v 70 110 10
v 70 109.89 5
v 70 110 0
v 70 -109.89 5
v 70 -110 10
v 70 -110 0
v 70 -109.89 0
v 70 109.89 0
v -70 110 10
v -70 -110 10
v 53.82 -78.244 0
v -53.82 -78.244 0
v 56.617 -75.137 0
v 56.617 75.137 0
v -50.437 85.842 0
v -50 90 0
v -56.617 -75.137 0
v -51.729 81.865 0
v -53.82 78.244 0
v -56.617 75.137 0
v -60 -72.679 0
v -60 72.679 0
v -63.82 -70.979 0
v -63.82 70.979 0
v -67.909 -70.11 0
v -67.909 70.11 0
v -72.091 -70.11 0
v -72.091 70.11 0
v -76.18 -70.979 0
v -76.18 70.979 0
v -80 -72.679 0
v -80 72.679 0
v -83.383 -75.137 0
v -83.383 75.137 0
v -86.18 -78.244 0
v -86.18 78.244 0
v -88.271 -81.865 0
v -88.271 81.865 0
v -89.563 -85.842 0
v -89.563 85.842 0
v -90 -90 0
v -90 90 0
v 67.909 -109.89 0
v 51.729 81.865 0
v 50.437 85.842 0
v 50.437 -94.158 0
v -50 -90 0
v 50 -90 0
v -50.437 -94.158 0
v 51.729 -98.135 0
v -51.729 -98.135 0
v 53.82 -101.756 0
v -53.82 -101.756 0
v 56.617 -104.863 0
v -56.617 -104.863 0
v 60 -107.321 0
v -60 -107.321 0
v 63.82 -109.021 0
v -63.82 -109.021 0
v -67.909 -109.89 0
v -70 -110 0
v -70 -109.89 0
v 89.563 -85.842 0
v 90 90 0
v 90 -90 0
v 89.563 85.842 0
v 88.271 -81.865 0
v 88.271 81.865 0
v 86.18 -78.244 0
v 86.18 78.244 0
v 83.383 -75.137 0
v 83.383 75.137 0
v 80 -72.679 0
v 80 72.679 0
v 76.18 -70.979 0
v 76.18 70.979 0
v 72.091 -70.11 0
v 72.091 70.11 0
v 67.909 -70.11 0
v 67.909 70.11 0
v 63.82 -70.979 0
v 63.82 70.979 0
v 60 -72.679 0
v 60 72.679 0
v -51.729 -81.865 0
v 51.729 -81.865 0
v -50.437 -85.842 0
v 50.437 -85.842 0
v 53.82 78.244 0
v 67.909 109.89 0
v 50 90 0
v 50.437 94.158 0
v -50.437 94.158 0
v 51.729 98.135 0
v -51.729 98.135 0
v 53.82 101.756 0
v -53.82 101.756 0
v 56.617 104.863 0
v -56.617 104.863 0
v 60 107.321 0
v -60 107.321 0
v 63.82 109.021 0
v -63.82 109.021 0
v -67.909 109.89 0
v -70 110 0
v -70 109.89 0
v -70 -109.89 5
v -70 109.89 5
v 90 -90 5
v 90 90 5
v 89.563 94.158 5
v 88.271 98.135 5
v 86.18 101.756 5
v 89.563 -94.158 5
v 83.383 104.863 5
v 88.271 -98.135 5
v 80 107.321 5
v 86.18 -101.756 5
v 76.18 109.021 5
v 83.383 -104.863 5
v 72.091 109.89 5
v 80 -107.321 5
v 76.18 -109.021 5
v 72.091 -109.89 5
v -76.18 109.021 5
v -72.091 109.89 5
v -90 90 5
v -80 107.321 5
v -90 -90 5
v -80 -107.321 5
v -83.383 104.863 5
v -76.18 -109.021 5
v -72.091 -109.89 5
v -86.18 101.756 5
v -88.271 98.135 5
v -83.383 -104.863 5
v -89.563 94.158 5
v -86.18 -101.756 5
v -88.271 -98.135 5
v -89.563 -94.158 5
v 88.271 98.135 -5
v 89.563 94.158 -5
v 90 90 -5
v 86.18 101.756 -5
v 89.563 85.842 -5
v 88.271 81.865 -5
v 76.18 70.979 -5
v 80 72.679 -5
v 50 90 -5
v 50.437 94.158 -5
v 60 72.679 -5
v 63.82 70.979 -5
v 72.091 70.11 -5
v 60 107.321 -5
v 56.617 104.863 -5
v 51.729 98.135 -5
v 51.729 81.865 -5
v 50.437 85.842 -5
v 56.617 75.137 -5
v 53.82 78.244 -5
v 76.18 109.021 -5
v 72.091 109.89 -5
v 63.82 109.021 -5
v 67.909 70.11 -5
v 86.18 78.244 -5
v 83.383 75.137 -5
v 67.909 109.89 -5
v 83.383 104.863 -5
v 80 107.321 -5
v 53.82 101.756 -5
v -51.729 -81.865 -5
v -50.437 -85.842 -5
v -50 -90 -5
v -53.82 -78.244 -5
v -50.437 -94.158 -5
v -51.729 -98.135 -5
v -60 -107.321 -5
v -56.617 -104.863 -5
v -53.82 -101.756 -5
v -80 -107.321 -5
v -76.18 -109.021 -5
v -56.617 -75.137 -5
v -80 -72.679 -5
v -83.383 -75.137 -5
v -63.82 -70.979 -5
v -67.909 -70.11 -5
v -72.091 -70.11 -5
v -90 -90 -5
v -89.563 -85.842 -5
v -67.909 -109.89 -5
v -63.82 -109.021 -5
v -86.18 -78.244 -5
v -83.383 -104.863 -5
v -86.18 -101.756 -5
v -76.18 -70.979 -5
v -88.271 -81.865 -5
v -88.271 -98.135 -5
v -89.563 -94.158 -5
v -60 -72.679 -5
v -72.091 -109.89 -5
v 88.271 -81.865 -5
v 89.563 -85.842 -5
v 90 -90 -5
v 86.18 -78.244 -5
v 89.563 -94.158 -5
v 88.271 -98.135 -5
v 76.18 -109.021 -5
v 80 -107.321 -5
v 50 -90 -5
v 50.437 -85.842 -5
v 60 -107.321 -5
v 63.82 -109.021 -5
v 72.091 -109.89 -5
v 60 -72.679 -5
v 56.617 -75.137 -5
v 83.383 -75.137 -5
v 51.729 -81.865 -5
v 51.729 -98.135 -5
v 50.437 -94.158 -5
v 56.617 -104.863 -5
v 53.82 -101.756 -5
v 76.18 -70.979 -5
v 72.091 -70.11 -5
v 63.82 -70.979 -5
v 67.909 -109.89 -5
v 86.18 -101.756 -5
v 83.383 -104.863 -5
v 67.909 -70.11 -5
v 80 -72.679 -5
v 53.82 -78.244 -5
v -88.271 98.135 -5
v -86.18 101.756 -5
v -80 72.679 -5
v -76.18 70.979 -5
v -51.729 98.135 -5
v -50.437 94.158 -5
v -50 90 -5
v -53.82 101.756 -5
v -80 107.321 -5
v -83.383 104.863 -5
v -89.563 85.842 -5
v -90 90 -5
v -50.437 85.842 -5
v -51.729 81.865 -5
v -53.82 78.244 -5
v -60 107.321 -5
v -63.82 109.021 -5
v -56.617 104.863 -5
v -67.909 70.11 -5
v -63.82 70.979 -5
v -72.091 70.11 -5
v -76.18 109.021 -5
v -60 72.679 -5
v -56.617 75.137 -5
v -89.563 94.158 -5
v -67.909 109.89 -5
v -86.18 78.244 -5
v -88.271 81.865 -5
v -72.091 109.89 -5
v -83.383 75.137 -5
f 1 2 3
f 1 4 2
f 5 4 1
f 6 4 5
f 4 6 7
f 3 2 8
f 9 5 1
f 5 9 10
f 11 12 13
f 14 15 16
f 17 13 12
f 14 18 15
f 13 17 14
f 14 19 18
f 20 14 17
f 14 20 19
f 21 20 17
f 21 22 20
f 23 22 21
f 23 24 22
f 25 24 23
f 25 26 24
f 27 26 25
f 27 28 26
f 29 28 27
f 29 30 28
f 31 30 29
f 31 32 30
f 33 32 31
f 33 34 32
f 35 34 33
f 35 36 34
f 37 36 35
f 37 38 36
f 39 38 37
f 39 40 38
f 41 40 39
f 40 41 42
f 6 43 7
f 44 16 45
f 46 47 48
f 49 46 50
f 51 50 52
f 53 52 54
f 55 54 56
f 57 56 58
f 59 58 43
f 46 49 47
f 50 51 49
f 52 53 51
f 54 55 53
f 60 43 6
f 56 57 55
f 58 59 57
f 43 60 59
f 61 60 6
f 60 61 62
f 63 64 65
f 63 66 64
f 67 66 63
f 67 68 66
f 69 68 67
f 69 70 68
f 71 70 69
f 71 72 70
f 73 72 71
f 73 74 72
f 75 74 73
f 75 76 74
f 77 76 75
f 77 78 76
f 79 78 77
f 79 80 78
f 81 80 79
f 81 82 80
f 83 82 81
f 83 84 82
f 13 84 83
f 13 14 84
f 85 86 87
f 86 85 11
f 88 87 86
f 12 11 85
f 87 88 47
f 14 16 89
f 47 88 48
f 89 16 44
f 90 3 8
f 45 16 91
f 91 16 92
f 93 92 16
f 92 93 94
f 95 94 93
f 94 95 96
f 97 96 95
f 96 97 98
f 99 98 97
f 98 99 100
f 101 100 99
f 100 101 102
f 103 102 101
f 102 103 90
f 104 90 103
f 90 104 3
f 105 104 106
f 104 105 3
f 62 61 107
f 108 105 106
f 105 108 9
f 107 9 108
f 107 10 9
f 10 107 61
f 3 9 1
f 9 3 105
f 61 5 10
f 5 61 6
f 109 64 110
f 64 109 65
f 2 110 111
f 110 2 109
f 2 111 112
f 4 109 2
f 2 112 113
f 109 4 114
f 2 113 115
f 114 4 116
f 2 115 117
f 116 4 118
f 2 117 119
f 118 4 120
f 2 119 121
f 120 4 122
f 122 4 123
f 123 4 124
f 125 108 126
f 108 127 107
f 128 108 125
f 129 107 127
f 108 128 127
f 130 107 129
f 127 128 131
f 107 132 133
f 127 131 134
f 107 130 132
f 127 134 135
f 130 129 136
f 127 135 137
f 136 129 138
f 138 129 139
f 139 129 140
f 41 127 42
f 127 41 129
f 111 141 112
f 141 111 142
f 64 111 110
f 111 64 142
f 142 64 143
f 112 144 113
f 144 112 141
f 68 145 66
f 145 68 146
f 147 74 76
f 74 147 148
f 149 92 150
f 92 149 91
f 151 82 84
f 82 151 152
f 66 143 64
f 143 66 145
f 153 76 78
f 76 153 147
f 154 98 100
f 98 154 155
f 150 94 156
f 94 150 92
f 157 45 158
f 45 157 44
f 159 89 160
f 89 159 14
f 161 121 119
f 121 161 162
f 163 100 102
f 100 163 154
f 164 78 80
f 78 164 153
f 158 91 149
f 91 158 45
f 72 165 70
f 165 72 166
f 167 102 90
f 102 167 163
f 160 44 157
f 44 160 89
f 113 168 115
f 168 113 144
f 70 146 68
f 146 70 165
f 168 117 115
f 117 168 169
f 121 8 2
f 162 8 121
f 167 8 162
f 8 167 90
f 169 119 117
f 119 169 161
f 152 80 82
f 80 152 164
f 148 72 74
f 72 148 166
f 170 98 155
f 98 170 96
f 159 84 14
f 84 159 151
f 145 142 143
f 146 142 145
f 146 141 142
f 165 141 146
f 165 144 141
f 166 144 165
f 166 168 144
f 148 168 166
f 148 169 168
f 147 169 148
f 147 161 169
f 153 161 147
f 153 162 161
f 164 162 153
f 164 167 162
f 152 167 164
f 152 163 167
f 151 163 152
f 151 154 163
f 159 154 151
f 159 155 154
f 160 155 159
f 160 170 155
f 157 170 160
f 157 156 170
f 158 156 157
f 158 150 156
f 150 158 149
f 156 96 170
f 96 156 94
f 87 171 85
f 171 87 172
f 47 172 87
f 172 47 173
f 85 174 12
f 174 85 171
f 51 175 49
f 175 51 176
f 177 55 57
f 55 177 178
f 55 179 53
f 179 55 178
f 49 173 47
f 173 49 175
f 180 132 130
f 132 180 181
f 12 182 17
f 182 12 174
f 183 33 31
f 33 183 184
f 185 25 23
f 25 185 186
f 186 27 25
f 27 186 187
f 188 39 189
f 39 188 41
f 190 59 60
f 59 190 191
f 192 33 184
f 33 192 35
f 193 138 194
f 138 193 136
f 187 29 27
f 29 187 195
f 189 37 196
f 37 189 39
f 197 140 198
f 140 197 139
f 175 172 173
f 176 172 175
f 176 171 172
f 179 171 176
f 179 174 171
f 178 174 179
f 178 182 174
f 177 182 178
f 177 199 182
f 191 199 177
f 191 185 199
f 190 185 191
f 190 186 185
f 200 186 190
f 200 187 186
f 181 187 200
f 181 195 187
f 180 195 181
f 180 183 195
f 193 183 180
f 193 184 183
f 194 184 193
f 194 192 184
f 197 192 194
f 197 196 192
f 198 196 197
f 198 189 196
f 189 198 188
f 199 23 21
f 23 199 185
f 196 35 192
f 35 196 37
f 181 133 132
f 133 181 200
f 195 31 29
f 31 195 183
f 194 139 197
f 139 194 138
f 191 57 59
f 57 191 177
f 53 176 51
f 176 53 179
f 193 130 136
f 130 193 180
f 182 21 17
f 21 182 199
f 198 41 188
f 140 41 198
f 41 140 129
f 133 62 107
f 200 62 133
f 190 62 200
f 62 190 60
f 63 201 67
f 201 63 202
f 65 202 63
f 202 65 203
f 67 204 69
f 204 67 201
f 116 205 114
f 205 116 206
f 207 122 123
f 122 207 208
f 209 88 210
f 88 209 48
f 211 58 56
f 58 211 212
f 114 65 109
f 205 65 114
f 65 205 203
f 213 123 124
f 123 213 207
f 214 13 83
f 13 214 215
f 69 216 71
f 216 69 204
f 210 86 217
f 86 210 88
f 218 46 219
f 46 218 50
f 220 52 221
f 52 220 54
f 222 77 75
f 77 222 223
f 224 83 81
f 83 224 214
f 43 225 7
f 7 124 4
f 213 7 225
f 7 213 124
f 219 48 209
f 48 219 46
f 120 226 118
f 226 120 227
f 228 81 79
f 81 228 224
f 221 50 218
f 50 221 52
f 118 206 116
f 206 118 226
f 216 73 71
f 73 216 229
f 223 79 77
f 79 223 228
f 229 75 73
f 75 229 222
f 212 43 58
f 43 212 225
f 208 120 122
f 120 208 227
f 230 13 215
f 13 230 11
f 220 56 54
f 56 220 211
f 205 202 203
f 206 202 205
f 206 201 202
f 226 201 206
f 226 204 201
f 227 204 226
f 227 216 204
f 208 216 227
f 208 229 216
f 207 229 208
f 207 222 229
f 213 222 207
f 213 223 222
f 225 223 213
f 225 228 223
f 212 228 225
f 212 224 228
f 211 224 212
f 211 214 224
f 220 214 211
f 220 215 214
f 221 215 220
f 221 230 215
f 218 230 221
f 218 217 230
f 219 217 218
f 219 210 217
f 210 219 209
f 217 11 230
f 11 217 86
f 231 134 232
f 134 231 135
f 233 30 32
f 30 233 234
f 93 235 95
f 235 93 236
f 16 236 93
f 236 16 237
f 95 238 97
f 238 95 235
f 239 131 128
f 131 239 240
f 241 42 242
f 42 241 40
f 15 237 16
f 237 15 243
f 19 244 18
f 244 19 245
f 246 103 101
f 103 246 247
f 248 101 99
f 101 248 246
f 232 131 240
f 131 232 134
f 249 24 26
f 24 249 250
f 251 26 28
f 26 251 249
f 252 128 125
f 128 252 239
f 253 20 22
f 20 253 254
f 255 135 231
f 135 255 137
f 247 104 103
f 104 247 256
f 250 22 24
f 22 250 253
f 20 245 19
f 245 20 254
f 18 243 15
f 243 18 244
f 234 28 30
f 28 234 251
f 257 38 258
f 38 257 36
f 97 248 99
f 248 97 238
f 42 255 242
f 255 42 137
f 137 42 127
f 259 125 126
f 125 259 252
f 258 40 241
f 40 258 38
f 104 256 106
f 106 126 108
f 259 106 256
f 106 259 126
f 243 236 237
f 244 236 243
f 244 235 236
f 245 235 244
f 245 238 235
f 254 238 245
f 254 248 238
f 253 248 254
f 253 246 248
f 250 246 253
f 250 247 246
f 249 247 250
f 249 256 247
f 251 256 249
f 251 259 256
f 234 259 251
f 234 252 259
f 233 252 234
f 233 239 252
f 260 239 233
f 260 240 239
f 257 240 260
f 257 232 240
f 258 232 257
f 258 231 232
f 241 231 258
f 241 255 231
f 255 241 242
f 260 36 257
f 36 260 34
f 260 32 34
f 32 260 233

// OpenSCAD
translate([-70,-110,0])
cube([140,220,10]);

translate([-90,-90,0])
cube([180,180,5]);

translate([+70,+90,0])
cylinder( h = 10, r = 20 , center = true );

translate([-70,-90,0])
cylinder( h = 10, r = 20 , center = true );

translate([+70,-90,0])
cylinder( h = 10, r = 20 , center = true );

translate([-70,+90,0])
cylinder( h = 10, r = 20 , center = true );
